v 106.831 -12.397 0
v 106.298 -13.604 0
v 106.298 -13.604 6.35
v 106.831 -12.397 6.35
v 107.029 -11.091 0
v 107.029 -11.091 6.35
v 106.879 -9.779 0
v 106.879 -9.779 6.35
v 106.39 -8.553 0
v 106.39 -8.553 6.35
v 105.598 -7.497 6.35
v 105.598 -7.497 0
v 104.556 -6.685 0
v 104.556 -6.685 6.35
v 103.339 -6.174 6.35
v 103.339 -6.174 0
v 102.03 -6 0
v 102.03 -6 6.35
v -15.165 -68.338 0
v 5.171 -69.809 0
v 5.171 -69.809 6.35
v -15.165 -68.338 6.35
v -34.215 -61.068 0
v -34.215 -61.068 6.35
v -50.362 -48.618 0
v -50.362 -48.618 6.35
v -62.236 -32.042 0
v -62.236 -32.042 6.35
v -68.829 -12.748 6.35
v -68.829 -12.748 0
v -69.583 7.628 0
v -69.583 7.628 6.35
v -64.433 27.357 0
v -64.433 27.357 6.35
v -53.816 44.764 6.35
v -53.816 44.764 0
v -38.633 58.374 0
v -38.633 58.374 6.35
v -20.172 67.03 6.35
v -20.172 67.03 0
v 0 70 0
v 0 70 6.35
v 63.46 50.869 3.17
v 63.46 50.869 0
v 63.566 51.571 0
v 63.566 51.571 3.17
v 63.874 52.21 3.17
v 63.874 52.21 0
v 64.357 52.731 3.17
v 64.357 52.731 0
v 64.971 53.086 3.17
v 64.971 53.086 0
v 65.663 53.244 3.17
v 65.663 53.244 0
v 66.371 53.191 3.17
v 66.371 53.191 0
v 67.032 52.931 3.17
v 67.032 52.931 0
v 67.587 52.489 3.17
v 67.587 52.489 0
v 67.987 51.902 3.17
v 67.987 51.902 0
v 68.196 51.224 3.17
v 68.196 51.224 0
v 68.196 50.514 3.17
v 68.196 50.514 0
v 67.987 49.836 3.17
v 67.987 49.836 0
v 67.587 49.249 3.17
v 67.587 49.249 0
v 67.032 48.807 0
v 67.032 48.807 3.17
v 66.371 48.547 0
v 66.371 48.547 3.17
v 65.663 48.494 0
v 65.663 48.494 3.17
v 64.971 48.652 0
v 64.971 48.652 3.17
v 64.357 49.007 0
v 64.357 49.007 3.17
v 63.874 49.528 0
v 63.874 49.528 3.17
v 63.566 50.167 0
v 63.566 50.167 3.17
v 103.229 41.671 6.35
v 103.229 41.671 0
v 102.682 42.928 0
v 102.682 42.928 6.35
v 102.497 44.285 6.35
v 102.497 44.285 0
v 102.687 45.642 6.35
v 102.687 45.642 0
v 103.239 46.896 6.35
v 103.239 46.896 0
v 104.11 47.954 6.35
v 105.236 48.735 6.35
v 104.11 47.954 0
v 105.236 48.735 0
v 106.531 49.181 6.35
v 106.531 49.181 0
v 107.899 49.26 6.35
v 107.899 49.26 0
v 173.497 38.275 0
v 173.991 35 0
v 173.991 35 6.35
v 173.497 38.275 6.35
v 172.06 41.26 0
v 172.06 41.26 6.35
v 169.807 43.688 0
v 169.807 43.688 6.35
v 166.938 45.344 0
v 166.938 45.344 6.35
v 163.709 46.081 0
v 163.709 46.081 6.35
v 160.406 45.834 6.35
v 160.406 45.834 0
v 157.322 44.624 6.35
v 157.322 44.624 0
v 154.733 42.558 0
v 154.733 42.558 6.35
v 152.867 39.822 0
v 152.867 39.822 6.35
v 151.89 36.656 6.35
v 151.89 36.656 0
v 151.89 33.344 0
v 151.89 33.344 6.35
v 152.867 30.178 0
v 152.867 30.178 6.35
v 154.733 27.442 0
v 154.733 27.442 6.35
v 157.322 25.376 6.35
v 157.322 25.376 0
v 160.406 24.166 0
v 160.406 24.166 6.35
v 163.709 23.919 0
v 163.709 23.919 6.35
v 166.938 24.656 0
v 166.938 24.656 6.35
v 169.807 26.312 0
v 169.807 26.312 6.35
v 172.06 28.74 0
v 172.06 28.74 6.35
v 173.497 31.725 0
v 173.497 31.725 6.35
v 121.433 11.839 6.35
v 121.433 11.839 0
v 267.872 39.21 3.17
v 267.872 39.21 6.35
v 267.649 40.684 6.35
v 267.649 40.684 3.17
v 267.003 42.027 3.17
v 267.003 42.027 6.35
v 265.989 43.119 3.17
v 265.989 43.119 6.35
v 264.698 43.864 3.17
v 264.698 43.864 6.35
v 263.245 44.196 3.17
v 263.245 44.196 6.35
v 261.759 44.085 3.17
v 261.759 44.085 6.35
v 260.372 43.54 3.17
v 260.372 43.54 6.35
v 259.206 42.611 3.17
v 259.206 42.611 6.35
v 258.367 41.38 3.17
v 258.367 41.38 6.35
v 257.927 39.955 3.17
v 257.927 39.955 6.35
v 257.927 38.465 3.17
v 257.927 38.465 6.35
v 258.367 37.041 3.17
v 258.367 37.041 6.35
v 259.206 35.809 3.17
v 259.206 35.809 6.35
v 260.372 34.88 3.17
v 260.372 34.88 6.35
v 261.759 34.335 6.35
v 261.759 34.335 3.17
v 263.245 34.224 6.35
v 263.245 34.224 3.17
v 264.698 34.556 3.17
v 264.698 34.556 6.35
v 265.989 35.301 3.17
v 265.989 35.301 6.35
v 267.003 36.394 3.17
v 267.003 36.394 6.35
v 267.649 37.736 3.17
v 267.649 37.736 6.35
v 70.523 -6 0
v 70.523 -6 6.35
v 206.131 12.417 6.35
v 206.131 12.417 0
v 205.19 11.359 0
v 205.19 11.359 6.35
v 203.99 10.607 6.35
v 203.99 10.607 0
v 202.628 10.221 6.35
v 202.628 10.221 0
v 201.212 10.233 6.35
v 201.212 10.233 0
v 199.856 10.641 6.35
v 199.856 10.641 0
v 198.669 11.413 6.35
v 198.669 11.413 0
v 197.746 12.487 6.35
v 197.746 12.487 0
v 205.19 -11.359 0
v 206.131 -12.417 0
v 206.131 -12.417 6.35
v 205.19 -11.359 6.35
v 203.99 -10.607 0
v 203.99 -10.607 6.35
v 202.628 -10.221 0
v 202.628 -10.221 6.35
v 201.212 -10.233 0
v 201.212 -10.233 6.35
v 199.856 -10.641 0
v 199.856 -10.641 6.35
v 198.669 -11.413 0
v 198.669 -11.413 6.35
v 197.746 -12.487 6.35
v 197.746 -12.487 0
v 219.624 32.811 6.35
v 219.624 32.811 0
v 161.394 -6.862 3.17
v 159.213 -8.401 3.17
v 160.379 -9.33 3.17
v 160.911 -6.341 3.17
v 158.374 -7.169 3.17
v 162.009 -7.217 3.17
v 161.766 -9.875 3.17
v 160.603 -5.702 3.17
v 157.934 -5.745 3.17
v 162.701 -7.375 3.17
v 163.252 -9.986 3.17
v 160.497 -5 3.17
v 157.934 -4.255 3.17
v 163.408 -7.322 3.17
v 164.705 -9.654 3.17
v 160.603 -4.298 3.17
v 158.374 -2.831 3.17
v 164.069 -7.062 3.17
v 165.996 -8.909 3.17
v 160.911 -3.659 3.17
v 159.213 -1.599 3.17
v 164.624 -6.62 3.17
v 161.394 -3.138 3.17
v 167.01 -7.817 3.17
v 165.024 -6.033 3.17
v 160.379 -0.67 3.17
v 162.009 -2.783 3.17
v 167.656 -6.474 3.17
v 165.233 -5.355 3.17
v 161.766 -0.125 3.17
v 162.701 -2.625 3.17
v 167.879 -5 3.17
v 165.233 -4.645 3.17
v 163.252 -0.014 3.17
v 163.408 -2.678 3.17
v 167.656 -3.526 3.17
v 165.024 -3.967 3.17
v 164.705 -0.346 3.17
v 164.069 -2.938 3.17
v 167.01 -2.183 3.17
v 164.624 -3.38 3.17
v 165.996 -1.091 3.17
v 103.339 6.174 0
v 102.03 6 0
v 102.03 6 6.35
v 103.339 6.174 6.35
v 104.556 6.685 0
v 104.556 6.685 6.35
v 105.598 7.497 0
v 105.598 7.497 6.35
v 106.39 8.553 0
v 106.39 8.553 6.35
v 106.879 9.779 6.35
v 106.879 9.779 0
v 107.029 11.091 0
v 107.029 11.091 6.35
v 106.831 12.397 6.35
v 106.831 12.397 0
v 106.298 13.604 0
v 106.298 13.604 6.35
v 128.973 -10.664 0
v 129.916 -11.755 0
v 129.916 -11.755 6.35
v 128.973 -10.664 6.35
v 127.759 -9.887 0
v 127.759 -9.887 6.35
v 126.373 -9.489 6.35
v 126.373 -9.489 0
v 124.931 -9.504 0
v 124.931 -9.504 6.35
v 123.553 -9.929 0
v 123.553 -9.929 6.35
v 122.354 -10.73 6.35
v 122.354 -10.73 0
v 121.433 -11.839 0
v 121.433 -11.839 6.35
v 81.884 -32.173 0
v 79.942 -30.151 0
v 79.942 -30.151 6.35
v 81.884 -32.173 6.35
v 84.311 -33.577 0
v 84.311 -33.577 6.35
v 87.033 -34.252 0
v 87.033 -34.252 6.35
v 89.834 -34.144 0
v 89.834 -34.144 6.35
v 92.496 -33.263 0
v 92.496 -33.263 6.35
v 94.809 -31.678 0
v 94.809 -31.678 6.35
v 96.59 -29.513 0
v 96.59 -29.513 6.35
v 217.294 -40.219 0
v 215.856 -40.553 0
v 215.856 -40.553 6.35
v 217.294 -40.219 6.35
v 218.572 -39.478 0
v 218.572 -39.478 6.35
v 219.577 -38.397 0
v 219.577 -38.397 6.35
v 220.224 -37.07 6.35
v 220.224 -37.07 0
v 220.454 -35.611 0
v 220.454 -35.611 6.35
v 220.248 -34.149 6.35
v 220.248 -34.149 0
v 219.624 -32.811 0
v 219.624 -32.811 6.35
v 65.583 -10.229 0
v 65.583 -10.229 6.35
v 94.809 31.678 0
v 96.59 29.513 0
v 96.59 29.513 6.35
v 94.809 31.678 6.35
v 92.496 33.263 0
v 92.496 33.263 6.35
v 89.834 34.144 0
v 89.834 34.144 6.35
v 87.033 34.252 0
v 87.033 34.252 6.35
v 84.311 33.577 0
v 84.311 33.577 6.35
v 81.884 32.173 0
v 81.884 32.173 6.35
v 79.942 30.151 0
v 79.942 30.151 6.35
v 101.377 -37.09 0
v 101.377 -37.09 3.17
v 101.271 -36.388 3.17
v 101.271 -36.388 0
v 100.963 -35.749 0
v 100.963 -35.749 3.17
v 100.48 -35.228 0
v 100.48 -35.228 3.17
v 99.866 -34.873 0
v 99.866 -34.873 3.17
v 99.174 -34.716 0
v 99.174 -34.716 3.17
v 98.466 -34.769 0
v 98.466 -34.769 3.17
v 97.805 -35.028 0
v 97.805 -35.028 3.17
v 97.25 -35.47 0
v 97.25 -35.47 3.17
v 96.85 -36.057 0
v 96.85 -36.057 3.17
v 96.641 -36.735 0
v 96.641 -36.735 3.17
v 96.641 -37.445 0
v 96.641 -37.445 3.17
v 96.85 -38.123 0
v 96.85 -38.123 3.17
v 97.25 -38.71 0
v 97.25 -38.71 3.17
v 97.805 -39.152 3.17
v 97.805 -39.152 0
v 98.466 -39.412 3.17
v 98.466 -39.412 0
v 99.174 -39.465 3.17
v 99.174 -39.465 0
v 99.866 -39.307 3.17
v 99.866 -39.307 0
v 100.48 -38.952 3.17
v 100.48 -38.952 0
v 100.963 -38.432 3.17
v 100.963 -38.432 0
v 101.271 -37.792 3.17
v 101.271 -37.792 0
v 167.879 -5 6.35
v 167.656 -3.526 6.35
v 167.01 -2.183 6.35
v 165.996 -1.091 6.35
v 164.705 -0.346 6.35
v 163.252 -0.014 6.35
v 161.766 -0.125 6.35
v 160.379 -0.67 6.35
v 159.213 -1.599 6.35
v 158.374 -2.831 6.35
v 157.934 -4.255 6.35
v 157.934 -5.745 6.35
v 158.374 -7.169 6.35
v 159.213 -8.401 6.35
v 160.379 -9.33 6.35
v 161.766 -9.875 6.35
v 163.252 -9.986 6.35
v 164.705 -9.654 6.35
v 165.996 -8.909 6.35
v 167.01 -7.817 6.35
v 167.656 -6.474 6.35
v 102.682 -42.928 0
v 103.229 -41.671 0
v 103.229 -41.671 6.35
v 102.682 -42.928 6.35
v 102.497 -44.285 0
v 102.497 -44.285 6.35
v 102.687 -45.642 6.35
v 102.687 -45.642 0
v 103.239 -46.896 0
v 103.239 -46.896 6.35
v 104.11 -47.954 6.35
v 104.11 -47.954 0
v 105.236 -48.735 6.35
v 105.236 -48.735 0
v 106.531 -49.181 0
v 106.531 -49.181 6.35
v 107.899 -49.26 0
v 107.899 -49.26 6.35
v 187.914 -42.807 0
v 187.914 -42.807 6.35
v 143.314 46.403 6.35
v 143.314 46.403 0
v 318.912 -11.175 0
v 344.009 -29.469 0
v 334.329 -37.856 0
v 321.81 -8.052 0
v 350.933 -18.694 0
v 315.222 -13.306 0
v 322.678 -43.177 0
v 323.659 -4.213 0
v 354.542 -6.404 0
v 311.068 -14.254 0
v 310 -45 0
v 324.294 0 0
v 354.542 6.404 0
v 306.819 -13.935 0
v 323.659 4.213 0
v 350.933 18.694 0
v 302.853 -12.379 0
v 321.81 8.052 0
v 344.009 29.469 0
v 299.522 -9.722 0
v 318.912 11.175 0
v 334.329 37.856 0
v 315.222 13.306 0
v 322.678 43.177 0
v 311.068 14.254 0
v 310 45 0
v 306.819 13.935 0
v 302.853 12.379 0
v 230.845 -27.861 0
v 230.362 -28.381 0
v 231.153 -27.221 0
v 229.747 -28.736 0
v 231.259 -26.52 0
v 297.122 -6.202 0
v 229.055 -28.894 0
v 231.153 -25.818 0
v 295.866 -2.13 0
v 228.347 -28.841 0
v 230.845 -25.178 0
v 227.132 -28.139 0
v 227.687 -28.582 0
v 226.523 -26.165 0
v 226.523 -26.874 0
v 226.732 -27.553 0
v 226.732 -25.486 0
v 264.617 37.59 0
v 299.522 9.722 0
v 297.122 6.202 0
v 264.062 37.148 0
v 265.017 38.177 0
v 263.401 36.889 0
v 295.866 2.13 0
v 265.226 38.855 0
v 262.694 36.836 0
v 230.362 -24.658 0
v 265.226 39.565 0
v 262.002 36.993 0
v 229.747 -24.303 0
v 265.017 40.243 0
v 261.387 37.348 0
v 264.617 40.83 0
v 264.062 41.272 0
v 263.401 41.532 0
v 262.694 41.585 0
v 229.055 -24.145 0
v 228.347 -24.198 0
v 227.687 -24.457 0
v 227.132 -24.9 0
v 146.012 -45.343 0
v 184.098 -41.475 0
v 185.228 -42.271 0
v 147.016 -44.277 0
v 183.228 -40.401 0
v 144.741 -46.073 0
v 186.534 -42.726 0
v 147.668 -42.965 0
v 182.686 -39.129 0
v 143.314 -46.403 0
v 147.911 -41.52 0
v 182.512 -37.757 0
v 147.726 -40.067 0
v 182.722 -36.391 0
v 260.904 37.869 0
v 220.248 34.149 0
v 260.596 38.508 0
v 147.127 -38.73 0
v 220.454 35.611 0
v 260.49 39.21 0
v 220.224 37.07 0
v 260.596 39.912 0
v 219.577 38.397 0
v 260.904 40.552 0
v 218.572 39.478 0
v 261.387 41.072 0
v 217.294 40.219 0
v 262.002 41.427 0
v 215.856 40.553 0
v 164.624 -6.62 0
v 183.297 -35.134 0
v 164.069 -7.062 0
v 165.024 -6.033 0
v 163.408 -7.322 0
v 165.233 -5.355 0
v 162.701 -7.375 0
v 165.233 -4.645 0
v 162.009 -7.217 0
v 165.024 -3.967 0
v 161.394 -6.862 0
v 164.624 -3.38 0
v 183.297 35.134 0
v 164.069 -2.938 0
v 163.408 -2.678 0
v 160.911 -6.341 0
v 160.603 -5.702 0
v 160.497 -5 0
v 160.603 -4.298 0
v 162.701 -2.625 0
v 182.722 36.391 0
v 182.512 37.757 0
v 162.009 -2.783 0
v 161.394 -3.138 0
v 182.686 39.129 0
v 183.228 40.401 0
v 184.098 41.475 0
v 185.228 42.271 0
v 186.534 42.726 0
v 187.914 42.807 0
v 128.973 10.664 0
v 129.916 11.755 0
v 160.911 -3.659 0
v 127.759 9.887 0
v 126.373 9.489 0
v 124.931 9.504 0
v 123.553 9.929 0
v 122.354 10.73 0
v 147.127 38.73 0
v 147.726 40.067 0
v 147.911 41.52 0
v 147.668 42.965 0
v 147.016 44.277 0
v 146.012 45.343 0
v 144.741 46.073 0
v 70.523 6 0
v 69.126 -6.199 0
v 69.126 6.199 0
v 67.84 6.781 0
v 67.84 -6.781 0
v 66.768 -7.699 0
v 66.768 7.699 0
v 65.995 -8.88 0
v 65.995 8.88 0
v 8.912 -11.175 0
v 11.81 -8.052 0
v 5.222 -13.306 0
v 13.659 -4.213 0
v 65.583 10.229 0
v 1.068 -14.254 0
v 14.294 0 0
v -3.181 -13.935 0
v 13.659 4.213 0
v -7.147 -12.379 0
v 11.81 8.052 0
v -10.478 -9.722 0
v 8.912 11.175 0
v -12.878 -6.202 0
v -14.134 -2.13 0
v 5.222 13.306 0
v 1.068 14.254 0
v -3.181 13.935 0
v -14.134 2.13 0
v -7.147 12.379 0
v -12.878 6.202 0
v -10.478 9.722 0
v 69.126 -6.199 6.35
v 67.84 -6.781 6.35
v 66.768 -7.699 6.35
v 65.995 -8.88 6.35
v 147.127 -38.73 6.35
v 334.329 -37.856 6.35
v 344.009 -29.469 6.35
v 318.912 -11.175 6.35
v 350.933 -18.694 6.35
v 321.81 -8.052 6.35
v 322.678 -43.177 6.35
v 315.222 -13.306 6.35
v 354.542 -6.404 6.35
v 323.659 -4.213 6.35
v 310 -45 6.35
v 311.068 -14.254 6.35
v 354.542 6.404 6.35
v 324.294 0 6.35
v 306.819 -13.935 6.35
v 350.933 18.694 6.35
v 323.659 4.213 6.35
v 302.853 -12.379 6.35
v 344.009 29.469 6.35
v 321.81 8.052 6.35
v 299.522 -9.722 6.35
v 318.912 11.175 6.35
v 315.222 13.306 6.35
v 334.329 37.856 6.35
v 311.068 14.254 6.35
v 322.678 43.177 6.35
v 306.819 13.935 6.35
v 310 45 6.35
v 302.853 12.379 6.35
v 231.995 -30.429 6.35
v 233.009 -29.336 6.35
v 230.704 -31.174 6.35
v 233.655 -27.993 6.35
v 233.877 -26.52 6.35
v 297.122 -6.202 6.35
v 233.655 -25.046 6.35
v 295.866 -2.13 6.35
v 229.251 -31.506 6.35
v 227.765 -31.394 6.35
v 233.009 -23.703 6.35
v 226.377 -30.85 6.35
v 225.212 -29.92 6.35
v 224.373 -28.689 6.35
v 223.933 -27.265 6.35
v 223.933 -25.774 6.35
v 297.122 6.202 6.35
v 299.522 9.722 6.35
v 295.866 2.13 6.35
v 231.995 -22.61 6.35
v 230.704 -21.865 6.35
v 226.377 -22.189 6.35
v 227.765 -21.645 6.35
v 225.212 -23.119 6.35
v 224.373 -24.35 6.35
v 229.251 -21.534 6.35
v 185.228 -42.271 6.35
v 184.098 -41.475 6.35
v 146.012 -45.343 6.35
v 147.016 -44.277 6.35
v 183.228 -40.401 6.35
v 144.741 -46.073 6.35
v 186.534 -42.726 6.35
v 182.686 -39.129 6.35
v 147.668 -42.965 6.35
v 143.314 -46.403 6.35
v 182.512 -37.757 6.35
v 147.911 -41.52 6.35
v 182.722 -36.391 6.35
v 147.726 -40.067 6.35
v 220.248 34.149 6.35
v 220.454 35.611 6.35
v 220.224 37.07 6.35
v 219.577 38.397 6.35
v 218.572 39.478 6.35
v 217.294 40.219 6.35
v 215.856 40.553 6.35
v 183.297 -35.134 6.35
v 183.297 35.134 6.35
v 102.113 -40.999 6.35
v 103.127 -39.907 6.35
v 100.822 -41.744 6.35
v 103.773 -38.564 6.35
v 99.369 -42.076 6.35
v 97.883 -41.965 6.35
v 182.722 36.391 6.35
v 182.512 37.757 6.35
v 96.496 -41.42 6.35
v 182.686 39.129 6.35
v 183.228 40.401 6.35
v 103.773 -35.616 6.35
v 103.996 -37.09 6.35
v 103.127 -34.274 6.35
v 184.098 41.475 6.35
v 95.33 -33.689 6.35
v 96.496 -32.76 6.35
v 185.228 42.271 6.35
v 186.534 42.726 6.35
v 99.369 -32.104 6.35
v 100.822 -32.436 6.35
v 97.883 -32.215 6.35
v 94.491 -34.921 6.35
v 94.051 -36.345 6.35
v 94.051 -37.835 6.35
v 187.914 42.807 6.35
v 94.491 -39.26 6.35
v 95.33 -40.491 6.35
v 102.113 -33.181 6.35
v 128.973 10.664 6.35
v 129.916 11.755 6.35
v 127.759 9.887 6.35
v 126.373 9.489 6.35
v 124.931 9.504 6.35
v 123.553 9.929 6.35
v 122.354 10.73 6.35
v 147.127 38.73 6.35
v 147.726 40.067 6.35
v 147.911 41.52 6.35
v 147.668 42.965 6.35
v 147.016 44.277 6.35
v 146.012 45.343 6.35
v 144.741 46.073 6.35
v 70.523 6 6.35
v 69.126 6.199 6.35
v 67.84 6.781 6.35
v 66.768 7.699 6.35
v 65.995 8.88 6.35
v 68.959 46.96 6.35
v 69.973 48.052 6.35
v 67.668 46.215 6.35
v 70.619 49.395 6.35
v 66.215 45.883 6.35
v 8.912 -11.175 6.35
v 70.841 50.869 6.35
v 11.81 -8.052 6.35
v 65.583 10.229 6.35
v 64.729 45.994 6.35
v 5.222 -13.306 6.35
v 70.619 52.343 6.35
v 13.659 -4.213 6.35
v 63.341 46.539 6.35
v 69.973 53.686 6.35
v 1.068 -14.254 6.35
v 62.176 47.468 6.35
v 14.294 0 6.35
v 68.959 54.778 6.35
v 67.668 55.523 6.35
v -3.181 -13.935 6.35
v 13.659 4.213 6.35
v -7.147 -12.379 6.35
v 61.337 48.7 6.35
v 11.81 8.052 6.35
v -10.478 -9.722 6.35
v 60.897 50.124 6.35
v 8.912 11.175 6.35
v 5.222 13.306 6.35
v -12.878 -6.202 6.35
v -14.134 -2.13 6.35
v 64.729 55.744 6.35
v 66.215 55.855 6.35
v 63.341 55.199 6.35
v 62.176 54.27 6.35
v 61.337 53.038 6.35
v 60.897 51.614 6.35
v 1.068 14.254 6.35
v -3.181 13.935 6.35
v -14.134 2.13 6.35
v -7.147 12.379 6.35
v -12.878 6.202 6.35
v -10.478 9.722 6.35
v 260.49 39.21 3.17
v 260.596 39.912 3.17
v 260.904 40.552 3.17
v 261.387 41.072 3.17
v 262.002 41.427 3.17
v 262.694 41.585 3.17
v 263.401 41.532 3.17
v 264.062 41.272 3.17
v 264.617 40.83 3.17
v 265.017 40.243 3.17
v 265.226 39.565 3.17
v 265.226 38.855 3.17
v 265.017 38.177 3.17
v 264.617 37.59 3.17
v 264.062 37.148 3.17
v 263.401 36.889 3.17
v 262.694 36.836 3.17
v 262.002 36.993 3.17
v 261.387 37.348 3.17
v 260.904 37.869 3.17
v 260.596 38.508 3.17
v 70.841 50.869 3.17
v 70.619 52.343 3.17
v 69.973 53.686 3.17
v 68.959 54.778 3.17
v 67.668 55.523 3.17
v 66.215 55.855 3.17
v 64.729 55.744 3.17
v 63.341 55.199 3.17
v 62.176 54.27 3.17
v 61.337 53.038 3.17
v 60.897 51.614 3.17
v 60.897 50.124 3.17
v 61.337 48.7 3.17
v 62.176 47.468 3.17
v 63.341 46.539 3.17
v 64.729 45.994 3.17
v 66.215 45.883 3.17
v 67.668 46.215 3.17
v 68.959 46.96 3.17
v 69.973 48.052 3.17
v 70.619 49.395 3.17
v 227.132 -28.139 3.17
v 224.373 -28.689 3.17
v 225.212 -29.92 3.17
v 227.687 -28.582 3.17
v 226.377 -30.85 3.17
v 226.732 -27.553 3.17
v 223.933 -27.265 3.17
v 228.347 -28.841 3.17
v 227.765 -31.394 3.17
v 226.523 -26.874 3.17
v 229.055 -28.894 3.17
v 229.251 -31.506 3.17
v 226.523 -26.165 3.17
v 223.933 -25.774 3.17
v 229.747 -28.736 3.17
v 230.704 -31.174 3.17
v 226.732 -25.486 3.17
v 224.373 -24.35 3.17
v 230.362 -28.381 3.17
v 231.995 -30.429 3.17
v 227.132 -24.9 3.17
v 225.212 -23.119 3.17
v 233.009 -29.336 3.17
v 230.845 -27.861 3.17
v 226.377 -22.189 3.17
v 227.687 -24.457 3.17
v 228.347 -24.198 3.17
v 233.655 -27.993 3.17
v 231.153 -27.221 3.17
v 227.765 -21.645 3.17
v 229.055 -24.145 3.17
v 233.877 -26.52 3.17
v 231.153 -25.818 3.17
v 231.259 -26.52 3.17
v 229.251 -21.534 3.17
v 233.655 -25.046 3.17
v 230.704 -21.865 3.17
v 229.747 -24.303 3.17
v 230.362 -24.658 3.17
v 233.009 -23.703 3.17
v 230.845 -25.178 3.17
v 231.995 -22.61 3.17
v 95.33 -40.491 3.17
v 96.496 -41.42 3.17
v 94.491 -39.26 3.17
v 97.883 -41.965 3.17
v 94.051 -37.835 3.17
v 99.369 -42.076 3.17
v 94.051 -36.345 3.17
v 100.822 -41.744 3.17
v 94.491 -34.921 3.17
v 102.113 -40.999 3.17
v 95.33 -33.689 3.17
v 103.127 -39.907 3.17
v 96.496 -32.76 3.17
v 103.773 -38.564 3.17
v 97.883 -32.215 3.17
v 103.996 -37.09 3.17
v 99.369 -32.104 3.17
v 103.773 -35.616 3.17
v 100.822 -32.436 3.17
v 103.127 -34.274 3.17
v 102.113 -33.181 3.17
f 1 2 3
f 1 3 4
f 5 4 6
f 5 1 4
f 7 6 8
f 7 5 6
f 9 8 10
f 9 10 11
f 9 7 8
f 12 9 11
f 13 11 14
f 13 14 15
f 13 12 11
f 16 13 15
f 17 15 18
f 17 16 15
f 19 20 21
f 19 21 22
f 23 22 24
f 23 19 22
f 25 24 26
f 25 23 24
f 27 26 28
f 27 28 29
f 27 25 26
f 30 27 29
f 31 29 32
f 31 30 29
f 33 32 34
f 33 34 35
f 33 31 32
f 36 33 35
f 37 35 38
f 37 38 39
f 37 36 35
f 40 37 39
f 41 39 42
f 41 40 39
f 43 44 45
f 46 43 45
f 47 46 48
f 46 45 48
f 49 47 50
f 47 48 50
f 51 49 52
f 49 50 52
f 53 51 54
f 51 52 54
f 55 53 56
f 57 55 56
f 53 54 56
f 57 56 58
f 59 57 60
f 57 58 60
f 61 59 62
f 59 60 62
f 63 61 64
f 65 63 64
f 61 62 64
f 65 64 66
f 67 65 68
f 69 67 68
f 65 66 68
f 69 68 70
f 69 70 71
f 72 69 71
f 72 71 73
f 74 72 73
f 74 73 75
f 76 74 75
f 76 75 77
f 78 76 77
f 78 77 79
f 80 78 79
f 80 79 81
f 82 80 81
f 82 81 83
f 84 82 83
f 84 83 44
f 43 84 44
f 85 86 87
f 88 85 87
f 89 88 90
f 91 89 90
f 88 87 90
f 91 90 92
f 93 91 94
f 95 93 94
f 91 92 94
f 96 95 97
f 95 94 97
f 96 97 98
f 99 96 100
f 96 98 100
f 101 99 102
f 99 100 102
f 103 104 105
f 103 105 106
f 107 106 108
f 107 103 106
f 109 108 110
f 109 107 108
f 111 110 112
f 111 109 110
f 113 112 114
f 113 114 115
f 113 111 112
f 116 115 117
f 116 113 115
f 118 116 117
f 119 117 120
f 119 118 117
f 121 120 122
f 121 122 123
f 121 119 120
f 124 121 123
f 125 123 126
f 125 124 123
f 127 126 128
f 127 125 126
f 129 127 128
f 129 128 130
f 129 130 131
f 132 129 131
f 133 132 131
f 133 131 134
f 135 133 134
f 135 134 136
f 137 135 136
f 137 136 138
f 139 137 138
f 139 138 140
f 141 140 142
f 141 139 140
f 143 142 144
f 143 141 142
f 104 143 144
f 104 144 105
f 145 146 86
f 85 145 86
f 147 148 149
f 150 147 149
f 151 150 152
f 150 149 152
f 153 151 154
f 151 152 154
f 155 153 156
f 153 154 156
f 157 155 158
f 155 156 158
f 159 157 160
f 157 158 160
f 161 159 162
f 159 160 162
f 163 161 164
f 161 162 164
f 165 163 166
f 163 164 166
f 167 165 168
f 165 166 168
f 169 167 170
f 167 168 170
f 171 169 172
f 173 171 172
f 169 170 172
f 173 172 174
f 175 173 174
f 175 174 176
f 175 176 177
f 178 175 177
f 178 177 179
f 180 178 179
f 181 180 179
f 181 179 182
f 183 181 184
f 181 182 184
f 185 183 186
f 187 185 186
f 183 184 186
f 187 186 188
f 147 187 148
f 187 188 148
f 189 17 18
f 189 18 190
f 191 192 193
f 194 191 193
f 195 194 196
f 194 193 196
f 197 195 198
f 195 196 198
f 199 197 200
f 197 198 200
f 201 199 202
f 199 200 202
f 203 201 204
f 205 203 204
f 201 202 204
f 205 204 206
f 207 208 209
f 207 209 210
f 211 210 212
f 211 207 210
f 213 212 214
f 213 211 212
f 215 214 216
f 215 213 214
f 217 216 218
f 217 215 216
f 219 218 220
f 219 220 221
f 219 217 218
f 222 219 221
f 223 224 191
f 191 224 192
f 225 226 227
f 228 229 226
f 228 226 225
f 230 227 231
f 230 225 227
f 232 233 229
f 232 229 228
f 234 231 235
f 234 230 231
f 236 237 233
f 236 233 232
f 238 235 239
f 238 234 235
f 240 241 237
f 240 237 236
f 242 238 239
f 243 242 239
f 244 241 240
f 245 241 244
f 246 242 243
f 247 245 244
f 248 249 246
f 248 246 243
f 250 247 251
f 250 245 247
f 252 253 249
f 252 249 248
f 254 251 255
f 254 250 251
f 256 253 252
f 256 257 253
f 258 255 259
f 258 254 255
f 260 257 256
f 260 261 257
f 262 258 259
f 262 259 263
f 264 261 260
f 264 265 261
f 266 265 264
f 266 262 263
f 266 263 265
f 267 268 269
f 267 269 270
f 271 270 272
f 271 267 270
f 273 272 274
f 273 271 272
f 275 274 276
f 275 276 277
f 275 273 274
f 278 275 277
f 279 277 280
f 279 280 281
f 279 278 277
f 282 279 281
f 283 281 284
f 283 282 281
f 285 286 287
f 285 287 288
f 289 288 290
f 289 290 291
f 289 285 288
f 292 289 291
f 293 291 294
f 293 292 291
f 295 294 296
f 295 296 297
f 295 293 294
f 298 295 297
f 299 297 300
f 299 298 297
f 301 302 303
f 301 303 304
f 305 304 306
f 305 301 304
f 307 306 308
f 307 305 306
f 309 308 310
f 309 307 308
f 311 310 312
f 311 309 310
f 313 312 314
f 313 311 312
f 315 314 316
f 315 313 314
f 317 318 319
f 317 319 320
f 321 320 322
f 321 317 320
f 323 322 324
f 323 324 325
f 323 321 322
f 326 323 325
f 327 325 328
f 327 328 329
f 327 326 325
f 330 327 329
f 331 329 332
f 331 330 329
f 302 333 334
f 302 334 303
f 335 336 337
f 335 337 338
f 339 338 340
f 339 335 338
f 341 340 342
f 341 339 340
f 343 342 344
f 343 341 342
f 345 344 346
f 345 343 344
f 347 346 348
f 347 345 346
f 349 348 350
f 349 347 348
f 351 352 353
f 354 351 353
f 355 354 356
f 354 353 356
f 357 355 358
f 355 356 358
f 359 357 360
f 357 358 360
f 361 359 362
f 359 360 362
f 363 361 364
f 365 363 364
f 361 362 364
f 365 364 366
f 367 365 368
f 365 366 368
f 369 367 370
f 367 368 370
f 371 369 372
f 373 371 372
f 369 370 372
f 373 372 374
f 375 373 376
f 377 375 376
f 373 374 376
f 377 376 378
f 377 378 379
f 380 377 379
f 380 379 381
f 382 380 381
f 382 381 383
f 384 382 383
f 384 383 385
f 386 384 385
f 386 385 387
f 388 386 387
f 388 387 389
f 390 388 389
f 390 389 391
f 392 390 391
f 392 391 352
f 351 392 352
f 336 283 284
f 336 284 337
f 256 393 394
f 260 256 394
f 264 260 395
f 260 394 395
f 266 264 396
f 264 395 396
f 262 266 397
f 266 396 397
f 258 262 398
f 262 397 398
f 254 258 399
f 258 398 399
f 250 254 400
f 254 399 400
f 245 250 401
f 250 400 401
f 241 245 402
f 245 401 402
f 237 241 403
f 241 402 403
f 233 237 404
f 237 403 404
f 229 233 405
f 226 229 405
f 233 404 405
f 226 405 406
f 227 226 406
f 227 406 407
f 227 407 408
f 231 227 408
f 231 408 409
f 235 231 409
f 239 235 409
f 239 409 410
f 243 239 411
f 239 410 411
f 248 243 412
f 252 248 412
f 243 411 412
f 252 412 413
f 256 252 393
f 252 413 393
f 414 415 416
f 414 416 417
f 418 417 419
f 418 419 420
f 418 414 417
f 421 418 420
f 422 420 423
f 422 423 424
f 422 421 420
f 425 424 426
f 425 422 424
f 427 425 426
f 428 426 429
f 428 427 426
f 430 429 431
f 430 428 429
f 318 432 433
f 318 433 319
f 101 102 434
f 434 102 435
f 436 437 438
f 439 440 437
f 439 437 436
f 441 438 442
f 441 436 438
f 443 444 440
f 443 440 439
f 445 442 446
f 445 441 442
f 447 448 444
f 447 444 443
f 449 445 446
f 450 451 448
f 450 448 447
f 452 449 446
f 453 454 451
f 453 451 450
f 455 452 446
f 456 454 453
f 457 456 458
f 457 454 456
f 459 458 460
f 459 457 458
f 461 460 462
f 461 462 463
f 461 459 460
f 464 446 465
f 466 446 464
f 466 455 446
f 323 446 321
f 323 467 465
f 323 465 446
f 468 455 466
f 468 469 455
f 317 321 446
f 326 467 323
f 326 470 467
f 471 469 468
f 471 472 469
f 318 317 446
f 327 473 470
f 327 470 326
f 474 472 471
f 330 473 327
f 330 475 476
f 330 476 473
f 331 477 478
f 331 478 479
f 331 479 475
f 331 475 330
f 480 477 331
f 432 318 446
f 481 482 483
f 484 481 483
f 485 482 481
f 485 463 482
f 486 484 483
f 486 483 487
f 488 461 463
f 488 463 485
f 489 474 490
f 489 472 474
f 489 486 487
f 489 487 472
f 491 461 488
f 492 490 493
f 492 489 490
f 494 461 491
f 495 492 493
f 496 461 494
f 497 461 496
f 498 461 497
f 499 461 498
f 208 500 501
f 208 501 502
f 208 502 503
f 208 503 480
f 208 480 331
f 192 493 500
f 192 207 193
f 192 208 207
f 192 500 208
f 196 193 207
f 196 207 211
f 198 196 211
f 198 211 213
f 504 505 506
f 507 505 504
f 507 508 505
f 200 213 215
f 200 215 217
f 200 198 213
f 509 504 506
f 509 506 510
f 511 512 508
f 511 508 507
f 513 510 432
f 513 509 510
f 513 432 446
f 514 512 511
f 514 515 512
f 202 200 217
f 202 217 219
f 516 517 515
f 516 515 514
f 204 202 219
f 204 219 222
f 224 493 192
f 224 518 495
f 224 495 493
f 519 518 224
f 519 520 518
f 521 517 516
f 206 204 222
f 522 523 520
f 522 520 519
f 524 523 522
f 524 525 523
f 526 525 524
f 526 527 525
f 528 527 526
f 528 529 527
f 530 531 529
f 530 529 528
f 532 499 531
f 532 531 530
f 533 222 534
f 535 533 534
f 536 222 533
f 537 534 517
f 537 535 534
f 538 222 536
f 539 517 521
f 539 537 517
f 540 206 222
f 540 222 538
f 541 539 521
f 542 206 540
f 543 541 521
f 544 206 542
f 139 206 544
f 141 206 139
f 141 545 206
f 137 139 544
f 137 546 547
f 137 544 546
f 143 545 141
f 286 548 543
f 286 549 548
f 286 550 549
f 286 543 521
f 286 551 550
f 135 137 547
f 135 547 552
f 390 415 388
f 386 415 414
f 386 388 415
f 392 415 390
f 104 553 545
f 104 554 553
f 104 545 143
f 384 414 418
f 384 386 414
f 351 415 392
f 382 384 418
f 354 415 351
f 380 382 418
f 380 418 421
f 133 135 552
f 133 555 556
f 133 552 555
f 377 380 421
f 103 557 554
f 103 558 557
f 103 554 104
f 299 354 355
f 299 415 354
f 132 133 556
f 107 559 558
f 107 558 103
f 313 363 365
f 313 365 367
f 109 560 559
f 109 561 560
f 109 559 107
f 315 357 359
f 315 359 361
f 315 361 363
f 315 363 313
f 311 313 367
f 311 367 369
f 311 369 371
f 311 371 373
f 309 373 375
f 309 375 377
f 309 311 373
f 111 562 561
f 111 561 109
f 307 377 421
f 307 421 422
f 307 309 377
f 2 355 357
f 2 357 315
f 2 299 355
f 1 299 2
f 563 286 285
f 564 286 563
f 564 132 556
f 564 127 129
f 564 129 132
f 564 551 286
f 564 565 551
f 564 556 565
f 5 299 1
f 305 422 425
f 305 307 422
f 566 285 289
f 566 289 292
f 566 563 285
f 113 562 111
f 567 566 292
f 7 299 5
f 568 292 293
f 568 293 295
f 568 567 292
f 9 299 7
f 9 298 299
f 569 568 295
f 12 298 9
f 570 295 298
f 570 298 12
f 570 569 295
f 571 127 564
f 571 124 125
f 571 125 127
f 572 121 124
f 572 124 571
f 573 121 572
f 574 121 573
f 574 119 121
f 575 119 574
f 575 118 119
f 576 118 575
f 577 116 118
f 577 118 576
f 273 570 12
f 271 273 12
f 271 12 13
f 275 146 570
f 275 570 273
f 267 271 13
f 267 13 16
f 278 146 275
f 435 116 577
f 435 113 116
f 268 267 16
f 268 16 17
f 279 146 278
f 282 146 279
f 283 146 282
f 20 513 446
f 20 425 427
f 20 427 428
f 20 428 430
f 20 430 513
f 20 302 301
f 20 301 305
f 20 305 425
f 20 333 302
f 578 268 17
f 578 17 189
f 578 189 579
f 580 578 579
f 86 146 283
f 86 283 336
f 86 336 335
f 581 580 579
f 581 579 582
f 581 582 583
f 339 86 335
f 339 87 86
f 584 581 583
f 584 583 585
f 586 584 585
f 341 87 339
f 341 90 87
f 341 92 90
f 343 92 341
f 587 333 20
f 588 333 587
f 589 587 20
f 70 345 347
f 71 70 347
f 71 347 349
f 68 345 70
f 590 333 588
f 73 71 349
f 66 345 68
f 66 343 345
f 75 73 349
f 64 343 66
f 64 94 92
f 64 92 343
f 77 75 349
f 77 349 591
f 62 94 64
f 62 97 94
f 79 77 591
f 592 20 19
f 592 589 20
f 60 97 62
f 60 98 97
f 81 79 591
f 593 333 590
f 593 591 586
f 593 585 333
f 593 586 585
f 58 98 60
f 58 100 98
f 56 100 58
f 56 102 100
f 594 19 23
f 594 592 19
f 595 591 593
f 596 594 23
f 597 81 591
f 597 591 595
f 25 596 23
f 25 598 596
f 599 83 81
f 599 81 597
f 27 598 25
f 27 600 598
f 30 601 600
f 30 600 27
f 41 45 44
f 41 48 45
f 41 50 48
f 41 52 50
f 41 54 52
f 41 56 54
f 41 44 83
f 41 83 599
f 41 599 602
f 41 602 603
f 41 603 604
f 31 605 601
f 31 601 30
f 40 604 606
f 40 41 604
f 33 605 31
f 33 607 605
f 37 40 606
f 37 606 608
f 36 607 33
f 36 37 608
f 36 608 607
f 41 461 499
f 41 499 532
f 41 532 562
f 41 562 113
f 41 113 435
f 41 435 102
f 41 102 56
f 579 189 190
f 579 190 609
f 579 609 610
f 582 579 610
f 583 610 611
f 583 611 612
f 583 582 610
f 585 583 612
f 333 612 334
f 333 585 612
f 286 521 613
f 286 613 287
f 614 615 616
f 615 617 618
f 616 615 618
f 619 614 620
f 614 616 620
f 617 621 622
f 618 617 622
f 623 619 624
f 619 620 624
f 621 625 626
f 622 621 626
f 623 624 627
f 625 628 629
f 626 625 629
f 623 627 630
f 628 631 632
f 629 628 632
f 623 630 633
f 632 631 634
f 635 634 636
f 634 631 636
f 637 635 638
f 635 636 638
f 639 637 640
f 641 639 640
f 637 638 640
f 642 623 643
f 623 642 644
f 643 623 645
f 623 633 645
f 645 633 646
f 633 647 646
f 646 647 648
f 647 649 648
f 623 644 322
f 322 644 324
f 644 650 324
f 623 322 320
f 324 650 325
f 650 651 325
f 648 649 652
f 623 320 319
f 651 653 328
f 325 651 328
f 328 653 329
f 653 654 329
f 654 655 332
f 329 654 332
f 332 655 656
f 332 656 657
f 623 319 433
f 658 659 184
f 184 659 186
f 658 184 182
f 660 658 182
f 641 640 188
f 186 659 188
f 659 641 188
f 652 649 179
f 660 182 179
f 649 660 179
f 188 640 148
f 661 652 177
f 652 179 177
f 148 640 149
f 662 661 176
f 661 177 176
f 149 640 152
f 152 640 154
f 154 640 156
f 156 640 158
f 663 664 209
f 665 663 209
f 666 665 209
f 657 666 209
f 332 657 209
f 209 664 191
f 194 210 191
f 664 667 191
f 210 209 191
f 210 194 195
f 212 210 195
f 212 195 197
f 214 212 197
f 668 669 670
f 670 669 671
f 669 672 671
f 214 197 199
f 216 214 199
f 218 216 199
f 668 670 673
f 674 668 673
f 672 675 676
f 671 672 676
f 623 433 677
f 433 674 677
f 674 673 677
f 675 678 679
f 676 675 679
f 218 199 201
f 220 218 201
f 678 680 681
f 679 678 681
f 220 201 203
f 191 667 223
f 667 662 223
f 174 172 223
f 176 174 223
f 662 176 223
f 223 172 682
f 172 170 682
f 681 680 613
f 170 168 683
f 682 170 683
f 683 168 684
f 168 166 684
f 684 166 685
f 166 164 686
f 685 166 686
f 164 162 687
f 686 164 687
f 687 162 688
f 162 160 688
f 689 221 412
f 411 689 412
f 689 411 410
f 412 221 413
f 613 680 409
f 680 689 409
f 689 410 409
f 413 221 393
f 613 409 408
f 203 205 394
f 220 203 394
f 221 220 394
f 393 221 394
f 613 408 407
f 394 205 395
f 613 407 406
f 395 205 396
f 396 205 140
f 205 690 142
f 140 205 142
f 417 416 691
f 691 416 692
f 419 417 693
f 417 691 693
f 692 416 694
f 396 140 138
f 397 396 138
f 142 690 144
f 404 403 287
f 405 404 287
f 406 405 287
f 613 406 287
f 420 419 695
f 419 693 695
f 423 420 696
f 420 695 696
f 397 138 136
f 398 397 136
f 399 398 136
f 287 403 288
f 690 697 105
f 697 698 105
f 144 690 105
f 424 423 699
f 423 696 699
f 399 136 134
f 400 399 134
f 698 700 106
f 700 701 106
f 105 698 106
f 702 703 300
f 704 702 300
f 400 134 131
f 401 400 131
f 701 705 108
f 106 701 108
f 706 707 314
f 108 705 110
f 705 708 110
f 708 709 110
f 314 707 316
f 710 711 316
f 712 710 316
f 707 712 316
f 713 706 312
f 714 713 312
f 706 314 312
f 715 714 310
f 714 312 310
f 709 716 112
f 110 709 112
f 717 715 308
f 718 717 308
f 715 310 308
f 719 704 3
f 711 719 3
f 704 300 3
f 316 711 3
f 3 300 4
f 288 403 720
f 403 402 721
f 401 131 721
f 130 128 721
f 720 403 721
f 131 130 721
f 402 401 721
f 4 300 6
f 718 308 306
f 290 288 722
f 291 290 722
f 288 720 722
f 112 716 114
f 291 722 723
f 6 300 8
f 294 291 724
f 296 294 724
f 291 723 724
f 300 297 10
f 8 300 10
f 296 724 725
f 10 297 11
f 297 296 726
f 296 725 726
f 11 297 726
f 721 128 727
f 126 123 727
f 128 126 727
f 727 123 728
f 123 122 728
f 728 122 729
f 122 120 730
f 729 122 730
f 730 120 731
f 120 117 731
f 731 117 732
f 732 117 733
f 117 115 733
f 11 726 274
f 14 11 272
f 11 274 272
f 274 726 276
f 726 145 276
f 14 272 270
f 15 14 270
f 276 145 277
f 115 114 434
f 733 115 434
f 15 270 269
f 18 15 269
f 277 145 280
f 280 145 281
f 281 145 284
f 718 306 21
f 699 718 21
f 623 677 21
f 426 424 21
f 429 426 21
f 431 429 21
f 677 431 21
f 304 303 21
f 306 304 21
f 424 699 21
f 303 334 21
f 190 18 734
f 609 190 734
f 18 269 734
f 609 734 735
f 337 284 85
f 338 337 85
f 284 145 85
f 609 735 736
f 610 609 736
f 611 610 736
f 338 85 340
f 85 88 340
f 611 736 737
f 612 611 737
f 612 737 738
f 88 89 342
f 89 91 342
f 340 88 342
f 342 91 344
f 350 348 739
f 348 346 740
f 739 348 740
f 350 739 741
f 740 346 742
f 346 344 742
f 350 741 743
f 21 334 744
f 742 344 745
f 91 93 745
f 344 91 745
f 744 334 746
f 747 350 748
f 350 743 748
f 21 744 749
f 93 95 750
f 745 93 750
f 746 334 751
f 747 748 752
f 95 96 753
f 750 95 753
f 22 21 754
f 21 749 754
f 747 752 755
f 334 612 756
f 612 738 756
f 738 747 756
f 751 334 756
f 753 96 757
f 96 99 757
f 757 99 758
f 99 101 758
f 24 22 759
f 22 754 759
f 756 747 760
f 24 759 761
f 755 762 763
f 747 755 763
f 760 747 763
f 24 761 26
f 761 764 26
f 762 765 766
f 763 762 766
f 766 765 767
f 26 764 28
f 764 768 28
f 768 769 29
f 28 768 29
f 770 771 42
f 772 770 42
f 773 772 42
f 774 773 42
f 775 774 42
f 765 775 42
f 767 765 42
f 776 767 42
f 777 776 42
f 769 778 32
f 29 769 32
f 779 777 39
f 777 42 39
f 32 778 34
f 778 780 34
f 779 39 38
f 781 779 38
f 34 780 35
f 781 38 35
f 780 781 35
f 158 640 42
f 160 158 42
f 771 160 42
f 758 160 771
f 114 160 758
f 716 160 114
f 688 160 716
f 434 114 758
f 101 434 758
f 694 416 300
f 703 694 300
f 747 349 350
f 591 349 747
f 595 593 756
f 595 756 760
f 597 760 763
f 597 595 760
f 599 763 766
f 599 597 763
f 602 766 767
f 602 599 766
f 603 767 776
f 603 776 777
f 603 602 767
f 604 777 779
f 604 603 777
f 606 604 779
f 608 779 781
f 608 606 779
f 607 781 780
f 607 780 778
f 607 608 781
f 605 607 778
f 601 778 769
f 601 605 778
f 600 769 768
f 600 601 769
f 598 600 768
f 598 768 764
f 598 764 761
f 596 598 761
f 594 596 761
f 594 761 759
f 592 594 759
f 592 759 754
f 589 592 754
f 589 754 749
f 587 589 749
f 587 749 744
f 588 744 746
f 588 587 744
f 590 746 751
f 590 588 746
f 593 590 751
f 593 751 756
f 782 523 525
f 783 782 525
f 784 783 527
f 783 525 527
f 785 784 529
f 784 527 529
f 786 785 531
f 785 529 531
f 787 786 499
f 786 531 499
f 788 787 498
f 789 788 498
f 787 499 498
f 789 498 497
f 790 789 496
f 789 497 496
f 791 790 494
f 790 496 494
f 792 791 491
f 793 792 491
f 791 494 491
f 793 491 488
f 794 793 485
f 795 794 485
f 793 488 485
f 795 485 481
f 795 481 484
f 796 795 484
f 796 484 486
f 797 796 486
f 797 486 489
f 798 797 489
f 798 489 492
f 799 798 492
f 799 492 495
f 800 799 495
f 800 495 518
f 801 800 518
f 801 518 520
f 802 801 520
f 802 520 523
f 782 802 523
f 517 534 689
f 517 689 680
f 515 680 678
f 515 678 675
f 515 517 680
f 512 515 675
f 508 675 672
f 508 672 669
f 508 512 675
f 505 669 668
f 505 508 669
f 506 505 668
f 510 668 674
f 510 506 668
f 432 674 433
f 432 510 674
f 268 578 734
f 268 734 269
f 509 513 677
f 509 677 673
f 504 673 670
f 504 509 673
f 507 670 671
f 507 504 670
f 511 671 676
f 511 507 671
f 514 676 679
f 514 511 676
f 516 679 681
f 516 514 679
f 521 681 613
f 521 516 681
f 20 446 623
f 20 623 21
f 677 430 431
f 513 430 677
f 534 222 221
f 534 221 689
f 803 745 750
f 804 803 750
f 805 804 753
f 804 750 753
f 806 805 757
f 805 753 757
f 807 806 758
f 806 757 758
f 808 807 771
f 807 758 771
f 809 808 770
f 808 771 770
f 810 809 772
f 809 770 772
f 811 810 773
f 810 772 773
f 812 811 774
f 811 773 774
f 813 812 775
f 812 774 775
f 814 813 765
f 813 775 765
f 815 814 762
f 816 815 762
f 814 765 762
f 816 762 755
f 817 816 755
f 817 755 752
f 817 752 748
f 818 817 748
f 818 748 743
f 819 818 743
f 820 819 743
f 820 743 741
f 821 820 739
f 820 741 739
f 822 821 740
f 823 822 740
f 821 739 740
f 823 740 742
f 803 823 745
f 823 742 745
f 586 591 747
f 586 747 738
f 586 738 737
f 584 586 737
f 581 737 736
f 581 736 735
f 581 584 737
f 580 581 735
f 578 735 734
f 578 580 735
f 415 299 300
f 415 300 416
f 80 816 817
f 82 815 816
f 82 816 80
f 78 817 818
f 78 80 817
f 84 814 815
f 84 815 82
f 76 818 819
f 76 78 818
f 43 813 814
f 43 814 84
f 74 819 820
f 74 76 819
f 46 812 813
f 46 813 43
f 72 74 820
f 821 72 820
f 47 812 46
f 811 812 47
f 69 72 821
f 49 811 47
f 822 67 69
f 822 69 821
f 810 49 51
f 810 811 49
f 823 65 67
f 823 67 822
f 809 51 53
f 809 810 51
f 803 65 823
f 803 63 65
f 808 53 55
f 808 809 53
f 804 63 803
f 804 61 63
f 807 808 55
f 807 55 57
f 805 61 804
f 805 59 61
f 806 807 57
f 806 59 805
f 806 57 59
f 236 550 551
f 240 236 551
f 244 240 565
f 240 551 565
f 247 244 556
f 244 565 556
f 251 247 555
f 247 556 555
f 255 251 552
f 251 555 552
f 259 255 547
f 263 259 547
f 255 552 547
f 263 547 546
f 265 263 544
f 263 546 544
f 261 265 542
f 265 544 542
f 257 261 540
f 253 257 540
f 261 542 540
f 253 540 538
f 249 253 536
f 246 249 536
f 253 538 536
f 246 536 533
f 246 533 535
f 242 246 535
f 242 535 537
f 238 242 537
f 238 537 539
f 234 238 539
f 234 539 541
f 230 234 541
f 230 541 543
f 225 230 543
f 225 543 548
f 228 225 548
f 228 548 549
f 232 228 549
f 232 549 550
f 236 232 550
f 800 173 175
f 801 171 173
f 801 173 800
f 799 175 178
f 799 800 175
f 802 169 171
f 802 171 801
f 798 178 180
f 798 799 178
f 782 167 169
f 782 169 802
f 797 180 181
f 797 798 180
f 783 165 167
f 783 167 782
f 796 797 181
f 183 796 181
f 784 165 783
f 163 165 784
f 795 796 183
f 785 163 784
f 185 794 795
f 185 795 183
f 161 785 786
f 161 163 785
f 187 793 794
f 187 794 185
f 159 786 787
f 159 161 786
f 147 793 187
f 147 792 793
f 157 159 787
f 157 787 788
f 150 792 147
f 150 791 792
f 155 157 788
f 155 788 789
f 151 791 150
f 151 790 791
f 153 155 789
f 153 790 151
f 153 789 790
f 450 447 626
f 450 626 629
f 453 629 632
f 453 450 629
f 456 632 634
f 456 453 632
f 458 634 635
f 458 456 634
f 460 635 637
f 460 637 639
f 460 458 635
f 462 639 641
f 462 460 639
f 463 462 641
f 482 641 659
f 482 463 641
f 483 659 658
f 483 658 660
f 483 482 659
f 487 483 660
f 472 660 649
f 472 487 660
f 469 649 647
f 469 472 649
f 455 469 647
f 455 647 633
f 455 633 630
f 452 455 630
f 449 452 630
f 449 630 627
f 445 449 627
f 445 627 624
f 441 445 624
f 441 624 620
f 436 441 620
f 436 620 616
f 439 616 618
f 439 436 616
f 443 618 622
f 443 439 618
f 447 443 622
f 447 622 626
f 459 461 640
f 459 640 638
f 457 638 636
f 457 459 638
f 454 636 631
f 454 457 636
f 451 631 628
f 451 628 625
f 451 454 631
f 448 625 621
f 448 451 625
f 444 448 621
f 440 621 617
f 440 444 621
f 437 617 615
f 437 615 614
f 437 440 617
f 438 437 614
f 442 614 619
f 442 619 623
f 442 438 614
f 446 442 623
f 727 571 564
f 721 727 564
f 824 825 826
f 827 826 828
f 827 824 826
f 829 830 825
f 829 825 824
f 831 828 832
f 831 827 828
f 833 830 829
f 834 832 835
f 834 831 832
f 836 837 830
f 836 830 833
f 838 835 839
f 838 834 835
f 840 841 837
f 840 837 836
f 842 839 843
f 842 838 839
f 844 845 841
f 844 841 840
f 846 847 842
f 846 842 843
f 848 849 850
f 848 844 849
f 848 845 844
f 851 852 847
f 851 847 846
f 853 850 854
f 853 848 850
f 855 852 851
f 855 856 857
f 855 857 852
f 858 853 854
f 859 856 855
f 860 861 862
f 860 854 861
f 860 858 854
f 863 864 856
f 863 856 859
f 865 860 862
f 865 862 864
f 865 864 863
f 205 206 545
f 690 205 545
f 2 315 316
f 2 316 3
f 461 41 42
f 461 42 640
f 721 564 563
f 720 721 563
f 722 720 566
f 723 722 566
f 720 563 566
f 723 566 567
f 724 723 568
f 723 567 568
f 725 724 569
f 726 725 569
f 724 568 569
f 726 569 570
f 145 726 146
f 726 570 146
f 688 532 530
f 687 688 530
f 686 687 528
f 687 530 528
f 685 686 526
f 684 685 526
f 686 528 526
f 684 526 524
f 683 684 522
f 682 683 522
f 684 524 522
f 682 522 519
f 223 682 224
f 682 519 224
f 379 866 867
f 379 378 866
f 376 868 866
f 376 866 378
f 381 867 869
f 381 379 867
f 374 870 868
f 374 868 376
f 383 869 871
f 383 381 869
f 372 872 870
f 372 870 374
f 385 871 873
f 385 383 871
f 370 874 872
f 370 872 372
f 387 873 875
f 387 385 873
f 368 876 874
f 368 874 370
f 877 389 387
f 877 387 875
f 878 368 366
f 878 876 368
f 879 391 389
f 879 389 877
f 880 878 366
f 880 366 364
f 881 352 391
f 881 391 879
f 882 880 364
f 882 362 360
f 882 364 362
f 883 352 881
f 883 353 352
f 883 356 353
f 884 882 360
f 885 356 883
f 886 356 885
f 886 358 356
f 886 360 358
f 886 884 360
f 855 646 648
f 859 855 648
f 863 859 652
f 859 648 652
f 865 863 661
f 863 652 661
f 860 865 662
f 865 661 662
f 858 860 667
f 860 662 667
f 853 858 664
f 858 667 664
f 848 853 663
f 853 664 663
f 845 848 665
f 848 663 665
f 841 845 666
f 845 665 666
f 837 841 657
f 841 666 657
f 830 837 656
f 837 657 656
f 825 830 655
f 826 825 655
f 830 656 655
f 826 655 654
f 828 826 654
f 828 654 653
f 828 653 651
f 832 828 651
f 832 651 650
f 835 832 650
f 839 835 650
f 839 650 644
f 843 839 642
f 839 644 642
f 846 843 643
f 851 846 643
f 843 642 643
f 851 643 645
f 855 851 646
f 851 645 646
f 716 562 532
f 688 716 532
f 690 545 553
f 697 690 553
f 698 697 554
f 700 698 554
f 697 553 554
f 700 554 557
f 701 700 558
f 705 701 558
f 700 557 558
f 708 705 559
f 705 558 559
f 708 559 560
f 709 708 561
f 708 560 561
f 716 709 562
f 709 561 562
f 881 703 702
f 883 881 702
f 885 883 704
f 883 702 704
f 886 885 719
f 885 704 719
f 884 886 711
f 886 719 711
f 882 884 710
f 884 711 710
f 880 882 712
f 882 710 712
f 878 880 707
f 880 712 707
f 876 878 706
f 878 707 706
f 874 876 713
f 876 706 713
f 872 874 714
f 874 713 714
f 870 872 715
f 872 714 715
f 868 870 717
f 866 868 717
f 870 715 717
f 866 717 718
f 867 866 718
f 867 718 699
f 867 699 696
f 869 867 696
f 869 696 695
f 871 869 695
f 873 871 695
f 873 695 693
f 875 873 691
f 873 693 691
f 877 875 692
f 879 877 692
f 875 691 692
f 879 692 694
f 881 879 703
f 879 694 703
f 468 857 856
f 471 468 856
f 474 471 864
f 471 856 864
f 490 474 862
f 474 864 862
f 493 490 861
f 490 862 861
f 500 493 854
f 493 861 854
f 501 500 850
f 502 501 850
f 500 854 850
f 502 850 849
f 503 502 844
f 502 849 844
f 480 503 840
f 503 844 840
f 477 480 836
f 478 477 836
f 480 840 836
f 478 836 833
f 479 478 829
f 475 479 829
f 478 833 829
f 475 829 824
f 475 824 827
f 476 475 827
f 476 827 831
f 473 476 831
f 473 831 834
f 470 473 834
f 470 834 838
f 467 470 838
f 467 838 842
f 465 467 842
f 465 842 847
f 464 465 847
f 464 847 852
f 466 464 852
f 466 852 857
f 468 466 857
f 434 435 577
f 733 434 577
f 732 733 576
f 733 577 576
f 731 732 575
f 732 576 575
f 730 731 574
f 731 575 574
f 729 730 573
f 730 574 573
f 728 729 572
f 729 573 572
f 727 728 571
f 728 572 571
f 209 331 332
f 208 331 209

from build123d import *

# Parameters (mm, degrees)
SKETCH1_R             = 14.29385
SKETCH1_R_2           = 11.1125
BOSS_EXTRUDE1_DEPTH   = 6.35
CROQUIS1_R            = 2.38125
CORTAR_EXTRUIR1_DEPTH = 50
CROQUIS6_R            = 2.38125
CORTAR_EXTRUIR4_DEPTH = 10
CROQUIS7_R            = 2.38125
CORTAR_EXTRUIR5_DEPTH = 10
CROQUIS9_R            = 5
CORTAR_EXTRUIR6_DEPTH = 3.18


with BuildPart() as part:
    # Sketch1 → Boss-Extrude1 (new body)
    with BuildSketch(Plane.XY):
        with BuildLine():
            Line((0, 70), (310, 45))
            ThreePointArc((310, 45), (355, 0), (310, -45))
            Line((310, -45), (5.171398252, -69.808714643))
            ThreePointArc((5.171398252, -69.808714643), (-69.952162315, -2.587467389), (0, 70))
        make_face()
        Circle(SKETCH1_R, mode=Mode.SUBTRACT)
        with Locations((310, 0)):
            Circle(SKETCH1_R, mode=Mode.SUBTRACT)
        with Locations((162.878542763, 35)):
            Circle(SKETCH1_R_2, mode=Mode.SUBTRACT)
        with BuildLine():
            Line((107.898974887, 49.259511156), (143.314248041, 46.40344074))
            ThreePointArc((143.314248041, 46.40344074), (147.389908855, 43.644764005), (147.127454118, 38.730252238))
            Line((147.127454118, 38.730252238), (129.916226305, 11.754586611))
            ThreePointArc((129.916226305, 11.754586611), (125.651076231, 9.444205574), (121.433006579, 11.839462159))
            Line((121.433006579, 11.839462159), (103.228961238, 41.671198203))
            ThreePointArc((103.228961238, 41.671198203), (103.238833139, 46.896293531), (107.898974887, 49.259511156))
        make_face(mode=Mode.SUBTRACT)
        with BuildLine():
            Line((70.523244027, 6), (102.03004784, 6))
            ThreePointArc((102.03004784, 6), (106.3902351, 8.552804247), (106.298140539, 13.604493178))
            Line((106.298140539, 13.604493178), (96.590354482, 29.513051181))
            ThreePointArc((96.590354482, 29.513051181), (88.437172177, 34.296727565), (79.941746192, 30.151166228))
            Line((79.941746192, 30.151166228), (65.58297828, 10.229432452))
            ThreePointArc((65.58297828, 10.229432452), (67.271539685, 7.201787411), (70.523244027, 6))
        make_face(mode=Mode.SUBTRACT)
        with BuildLine():
            Line((219.623774494, 32.810522613), (206.130928429, 12.417497436))
            ThreePointArc((206.130928429, 12.417497436), (201.919524559, 10.176643248), (197.745901529, 12.48710226))
            Line((197.745901529, 12.48710226), (183.296864227, 35.133505128))
            ThreePointArc((183.296864227, 35.133505128), (183.227765467, 40.400743015), (187.913912204, 42.80669363))
            Line((187.913912204, 42.80669363), (215.855795571, 40.553315939))
            ThreePointArc((215.855795571, 40.553315939), (219.949772588, 37.757395035), (219.623774494, 32.810522613))
        make_face(mode=Mode.SUBTRACT)
        with BuildLine():
            Line((96.590354482, -29.513051181), (106.298140539, -13.604493178))
            ThreePointArc((106.298140539, -13.604493178), (106.3902351, -8.552804247), (102.03004784, -6))
            Line((102.03004784, -6), (70.523244027, -6))
            ThreePointArc((70.523244027, -6), (67.271539685, -7.201787411), (65.58297828, -10.229432452))
            Line((65.58297828, -10.229432452), (79.941746192, -30.151166228))
            ThreePointArc((79.941746192, -30.151166228), (88.437172177, -34.296727565), (96.590354482, -29.513051181))
        make_face(mode=Mode.SUBTRACT)
        with BuildLine():
            Line((187.913912204, -42.80669363), (215.855795571, -40.553315939))
            ThreePointArc((215.855795571, -40.553315939), (219.949772588, -37.757395035), (219.623774494, -32.810522613))
            Line((219.623774494, -32.810522613), (206.130928429, -12.417497436))
            ThreePointArc((206.130928429, -12.417497436), (201.919524559, -10.176643248), (197.745901529, -12.48710226))
            Line((197.745901529, -12.48710226), (183.296864227, -35.133505128))
            ThreePointArc((183.296864227, -35.133505128), (183.227765467, -40.400743015), (187.913912204, -42.80669363))
        make_face(mode=Mode.SUBTRACT)
        with BuildLine():
            Line((121.433006579, -11.839462159), (103.228961238, -41.671198203))
            ThreePointArc((103.228961238, -41.671198203), (103.238833139, -46.896293531), (107.898974887, -49.259511156))
            Line((107.898974887, -49.259511156), (143.314248041, -46.40344074))
            ThreePointArc((143.314248041, -46.40344074), (147.389908855, -43.644764005), (147.127454118, -38.730252238))
            Line((147.127454118, -38.730252238), (129.916226305, -11.754586611))
            ThreePointArc((129.916226305, -11.754586611), (125.651076231, -9.444205574), (121.433006579, -11.839462159))
        make_face(mode=Mode.SUBTRACT)
    extrude(amount=BOSS_EXTRUDE1_DEPTH)

    # Croquis1 → Cortar-Extruir1 (cut)
    with BuildSketch(Plane.XY.offset(6.35)):
        with Locations((98.995555235, -37.090103176)):
            Circle(CROQUIS1_R)
        with Locations((228.877351461, -26.519571404)):
            Circle(CROQUIS1_R)
    extrude(amount=-CORTAR_EXTRUIR1_DEPTH, mode=Mode.SUBTRACT)

    # Croquis6 → Cortar-Extruir4 (cut)
    with BuildSketch(Plane(origin=(0, 0, 0), x_dir=(-1, 0, 0), z_dir=(0, 0, -1))):
        with Locations((-162.878542763, -5)):
            Circle(CROQUIS6_R)
    extrude(amount=-CORTAR_EXTRUIR4_DEPTH, mode=Mode.SUBTRACT)

    # Croquis7 → Cortar-Extruir5 (cut)
    with BuildSketch(Plane(origin=(0, 0, 0), x_dir=(-1, 0, 0), z_dir=(0, 0, -1))):
        with Locations((-65.84135797, 50.868973694)):
            Circle(CROQUIS7_R)
        with Locations((-262.871569638, 39.210126075)):
            Circle(CROQUIS7_R)
    extrude(amount=-CORTAR_EXTRUIR5_DEPTH, mode=Mode.SUBTRACT)

    # Croquis9 → Cortar-Extruir6 (cut)
    with BuildSketch(Plane.XY.offset(6.35)):
        with Locations((65.84135797, 50.868973694)):
            Circle(CROQUIS9_R)
        with Locations((162.878542763, -5)):
            Circle(CROQUIS9_R)
        with Locations((98.995555235, -37.090103176)):
            Circle(CROQUIS9_R)
        with Locations((228.877351461, -26.519571404)):
            Circle(CROQUIS9_R)
        with Locations((262.871569638, 39.210126075)):
            Circle(CROQUIS9_R)
    extrude(amount=-CORTAR_EXTRUIR6_DEPTH, mode=Mode.SUBTRACT)


solid = part.part
